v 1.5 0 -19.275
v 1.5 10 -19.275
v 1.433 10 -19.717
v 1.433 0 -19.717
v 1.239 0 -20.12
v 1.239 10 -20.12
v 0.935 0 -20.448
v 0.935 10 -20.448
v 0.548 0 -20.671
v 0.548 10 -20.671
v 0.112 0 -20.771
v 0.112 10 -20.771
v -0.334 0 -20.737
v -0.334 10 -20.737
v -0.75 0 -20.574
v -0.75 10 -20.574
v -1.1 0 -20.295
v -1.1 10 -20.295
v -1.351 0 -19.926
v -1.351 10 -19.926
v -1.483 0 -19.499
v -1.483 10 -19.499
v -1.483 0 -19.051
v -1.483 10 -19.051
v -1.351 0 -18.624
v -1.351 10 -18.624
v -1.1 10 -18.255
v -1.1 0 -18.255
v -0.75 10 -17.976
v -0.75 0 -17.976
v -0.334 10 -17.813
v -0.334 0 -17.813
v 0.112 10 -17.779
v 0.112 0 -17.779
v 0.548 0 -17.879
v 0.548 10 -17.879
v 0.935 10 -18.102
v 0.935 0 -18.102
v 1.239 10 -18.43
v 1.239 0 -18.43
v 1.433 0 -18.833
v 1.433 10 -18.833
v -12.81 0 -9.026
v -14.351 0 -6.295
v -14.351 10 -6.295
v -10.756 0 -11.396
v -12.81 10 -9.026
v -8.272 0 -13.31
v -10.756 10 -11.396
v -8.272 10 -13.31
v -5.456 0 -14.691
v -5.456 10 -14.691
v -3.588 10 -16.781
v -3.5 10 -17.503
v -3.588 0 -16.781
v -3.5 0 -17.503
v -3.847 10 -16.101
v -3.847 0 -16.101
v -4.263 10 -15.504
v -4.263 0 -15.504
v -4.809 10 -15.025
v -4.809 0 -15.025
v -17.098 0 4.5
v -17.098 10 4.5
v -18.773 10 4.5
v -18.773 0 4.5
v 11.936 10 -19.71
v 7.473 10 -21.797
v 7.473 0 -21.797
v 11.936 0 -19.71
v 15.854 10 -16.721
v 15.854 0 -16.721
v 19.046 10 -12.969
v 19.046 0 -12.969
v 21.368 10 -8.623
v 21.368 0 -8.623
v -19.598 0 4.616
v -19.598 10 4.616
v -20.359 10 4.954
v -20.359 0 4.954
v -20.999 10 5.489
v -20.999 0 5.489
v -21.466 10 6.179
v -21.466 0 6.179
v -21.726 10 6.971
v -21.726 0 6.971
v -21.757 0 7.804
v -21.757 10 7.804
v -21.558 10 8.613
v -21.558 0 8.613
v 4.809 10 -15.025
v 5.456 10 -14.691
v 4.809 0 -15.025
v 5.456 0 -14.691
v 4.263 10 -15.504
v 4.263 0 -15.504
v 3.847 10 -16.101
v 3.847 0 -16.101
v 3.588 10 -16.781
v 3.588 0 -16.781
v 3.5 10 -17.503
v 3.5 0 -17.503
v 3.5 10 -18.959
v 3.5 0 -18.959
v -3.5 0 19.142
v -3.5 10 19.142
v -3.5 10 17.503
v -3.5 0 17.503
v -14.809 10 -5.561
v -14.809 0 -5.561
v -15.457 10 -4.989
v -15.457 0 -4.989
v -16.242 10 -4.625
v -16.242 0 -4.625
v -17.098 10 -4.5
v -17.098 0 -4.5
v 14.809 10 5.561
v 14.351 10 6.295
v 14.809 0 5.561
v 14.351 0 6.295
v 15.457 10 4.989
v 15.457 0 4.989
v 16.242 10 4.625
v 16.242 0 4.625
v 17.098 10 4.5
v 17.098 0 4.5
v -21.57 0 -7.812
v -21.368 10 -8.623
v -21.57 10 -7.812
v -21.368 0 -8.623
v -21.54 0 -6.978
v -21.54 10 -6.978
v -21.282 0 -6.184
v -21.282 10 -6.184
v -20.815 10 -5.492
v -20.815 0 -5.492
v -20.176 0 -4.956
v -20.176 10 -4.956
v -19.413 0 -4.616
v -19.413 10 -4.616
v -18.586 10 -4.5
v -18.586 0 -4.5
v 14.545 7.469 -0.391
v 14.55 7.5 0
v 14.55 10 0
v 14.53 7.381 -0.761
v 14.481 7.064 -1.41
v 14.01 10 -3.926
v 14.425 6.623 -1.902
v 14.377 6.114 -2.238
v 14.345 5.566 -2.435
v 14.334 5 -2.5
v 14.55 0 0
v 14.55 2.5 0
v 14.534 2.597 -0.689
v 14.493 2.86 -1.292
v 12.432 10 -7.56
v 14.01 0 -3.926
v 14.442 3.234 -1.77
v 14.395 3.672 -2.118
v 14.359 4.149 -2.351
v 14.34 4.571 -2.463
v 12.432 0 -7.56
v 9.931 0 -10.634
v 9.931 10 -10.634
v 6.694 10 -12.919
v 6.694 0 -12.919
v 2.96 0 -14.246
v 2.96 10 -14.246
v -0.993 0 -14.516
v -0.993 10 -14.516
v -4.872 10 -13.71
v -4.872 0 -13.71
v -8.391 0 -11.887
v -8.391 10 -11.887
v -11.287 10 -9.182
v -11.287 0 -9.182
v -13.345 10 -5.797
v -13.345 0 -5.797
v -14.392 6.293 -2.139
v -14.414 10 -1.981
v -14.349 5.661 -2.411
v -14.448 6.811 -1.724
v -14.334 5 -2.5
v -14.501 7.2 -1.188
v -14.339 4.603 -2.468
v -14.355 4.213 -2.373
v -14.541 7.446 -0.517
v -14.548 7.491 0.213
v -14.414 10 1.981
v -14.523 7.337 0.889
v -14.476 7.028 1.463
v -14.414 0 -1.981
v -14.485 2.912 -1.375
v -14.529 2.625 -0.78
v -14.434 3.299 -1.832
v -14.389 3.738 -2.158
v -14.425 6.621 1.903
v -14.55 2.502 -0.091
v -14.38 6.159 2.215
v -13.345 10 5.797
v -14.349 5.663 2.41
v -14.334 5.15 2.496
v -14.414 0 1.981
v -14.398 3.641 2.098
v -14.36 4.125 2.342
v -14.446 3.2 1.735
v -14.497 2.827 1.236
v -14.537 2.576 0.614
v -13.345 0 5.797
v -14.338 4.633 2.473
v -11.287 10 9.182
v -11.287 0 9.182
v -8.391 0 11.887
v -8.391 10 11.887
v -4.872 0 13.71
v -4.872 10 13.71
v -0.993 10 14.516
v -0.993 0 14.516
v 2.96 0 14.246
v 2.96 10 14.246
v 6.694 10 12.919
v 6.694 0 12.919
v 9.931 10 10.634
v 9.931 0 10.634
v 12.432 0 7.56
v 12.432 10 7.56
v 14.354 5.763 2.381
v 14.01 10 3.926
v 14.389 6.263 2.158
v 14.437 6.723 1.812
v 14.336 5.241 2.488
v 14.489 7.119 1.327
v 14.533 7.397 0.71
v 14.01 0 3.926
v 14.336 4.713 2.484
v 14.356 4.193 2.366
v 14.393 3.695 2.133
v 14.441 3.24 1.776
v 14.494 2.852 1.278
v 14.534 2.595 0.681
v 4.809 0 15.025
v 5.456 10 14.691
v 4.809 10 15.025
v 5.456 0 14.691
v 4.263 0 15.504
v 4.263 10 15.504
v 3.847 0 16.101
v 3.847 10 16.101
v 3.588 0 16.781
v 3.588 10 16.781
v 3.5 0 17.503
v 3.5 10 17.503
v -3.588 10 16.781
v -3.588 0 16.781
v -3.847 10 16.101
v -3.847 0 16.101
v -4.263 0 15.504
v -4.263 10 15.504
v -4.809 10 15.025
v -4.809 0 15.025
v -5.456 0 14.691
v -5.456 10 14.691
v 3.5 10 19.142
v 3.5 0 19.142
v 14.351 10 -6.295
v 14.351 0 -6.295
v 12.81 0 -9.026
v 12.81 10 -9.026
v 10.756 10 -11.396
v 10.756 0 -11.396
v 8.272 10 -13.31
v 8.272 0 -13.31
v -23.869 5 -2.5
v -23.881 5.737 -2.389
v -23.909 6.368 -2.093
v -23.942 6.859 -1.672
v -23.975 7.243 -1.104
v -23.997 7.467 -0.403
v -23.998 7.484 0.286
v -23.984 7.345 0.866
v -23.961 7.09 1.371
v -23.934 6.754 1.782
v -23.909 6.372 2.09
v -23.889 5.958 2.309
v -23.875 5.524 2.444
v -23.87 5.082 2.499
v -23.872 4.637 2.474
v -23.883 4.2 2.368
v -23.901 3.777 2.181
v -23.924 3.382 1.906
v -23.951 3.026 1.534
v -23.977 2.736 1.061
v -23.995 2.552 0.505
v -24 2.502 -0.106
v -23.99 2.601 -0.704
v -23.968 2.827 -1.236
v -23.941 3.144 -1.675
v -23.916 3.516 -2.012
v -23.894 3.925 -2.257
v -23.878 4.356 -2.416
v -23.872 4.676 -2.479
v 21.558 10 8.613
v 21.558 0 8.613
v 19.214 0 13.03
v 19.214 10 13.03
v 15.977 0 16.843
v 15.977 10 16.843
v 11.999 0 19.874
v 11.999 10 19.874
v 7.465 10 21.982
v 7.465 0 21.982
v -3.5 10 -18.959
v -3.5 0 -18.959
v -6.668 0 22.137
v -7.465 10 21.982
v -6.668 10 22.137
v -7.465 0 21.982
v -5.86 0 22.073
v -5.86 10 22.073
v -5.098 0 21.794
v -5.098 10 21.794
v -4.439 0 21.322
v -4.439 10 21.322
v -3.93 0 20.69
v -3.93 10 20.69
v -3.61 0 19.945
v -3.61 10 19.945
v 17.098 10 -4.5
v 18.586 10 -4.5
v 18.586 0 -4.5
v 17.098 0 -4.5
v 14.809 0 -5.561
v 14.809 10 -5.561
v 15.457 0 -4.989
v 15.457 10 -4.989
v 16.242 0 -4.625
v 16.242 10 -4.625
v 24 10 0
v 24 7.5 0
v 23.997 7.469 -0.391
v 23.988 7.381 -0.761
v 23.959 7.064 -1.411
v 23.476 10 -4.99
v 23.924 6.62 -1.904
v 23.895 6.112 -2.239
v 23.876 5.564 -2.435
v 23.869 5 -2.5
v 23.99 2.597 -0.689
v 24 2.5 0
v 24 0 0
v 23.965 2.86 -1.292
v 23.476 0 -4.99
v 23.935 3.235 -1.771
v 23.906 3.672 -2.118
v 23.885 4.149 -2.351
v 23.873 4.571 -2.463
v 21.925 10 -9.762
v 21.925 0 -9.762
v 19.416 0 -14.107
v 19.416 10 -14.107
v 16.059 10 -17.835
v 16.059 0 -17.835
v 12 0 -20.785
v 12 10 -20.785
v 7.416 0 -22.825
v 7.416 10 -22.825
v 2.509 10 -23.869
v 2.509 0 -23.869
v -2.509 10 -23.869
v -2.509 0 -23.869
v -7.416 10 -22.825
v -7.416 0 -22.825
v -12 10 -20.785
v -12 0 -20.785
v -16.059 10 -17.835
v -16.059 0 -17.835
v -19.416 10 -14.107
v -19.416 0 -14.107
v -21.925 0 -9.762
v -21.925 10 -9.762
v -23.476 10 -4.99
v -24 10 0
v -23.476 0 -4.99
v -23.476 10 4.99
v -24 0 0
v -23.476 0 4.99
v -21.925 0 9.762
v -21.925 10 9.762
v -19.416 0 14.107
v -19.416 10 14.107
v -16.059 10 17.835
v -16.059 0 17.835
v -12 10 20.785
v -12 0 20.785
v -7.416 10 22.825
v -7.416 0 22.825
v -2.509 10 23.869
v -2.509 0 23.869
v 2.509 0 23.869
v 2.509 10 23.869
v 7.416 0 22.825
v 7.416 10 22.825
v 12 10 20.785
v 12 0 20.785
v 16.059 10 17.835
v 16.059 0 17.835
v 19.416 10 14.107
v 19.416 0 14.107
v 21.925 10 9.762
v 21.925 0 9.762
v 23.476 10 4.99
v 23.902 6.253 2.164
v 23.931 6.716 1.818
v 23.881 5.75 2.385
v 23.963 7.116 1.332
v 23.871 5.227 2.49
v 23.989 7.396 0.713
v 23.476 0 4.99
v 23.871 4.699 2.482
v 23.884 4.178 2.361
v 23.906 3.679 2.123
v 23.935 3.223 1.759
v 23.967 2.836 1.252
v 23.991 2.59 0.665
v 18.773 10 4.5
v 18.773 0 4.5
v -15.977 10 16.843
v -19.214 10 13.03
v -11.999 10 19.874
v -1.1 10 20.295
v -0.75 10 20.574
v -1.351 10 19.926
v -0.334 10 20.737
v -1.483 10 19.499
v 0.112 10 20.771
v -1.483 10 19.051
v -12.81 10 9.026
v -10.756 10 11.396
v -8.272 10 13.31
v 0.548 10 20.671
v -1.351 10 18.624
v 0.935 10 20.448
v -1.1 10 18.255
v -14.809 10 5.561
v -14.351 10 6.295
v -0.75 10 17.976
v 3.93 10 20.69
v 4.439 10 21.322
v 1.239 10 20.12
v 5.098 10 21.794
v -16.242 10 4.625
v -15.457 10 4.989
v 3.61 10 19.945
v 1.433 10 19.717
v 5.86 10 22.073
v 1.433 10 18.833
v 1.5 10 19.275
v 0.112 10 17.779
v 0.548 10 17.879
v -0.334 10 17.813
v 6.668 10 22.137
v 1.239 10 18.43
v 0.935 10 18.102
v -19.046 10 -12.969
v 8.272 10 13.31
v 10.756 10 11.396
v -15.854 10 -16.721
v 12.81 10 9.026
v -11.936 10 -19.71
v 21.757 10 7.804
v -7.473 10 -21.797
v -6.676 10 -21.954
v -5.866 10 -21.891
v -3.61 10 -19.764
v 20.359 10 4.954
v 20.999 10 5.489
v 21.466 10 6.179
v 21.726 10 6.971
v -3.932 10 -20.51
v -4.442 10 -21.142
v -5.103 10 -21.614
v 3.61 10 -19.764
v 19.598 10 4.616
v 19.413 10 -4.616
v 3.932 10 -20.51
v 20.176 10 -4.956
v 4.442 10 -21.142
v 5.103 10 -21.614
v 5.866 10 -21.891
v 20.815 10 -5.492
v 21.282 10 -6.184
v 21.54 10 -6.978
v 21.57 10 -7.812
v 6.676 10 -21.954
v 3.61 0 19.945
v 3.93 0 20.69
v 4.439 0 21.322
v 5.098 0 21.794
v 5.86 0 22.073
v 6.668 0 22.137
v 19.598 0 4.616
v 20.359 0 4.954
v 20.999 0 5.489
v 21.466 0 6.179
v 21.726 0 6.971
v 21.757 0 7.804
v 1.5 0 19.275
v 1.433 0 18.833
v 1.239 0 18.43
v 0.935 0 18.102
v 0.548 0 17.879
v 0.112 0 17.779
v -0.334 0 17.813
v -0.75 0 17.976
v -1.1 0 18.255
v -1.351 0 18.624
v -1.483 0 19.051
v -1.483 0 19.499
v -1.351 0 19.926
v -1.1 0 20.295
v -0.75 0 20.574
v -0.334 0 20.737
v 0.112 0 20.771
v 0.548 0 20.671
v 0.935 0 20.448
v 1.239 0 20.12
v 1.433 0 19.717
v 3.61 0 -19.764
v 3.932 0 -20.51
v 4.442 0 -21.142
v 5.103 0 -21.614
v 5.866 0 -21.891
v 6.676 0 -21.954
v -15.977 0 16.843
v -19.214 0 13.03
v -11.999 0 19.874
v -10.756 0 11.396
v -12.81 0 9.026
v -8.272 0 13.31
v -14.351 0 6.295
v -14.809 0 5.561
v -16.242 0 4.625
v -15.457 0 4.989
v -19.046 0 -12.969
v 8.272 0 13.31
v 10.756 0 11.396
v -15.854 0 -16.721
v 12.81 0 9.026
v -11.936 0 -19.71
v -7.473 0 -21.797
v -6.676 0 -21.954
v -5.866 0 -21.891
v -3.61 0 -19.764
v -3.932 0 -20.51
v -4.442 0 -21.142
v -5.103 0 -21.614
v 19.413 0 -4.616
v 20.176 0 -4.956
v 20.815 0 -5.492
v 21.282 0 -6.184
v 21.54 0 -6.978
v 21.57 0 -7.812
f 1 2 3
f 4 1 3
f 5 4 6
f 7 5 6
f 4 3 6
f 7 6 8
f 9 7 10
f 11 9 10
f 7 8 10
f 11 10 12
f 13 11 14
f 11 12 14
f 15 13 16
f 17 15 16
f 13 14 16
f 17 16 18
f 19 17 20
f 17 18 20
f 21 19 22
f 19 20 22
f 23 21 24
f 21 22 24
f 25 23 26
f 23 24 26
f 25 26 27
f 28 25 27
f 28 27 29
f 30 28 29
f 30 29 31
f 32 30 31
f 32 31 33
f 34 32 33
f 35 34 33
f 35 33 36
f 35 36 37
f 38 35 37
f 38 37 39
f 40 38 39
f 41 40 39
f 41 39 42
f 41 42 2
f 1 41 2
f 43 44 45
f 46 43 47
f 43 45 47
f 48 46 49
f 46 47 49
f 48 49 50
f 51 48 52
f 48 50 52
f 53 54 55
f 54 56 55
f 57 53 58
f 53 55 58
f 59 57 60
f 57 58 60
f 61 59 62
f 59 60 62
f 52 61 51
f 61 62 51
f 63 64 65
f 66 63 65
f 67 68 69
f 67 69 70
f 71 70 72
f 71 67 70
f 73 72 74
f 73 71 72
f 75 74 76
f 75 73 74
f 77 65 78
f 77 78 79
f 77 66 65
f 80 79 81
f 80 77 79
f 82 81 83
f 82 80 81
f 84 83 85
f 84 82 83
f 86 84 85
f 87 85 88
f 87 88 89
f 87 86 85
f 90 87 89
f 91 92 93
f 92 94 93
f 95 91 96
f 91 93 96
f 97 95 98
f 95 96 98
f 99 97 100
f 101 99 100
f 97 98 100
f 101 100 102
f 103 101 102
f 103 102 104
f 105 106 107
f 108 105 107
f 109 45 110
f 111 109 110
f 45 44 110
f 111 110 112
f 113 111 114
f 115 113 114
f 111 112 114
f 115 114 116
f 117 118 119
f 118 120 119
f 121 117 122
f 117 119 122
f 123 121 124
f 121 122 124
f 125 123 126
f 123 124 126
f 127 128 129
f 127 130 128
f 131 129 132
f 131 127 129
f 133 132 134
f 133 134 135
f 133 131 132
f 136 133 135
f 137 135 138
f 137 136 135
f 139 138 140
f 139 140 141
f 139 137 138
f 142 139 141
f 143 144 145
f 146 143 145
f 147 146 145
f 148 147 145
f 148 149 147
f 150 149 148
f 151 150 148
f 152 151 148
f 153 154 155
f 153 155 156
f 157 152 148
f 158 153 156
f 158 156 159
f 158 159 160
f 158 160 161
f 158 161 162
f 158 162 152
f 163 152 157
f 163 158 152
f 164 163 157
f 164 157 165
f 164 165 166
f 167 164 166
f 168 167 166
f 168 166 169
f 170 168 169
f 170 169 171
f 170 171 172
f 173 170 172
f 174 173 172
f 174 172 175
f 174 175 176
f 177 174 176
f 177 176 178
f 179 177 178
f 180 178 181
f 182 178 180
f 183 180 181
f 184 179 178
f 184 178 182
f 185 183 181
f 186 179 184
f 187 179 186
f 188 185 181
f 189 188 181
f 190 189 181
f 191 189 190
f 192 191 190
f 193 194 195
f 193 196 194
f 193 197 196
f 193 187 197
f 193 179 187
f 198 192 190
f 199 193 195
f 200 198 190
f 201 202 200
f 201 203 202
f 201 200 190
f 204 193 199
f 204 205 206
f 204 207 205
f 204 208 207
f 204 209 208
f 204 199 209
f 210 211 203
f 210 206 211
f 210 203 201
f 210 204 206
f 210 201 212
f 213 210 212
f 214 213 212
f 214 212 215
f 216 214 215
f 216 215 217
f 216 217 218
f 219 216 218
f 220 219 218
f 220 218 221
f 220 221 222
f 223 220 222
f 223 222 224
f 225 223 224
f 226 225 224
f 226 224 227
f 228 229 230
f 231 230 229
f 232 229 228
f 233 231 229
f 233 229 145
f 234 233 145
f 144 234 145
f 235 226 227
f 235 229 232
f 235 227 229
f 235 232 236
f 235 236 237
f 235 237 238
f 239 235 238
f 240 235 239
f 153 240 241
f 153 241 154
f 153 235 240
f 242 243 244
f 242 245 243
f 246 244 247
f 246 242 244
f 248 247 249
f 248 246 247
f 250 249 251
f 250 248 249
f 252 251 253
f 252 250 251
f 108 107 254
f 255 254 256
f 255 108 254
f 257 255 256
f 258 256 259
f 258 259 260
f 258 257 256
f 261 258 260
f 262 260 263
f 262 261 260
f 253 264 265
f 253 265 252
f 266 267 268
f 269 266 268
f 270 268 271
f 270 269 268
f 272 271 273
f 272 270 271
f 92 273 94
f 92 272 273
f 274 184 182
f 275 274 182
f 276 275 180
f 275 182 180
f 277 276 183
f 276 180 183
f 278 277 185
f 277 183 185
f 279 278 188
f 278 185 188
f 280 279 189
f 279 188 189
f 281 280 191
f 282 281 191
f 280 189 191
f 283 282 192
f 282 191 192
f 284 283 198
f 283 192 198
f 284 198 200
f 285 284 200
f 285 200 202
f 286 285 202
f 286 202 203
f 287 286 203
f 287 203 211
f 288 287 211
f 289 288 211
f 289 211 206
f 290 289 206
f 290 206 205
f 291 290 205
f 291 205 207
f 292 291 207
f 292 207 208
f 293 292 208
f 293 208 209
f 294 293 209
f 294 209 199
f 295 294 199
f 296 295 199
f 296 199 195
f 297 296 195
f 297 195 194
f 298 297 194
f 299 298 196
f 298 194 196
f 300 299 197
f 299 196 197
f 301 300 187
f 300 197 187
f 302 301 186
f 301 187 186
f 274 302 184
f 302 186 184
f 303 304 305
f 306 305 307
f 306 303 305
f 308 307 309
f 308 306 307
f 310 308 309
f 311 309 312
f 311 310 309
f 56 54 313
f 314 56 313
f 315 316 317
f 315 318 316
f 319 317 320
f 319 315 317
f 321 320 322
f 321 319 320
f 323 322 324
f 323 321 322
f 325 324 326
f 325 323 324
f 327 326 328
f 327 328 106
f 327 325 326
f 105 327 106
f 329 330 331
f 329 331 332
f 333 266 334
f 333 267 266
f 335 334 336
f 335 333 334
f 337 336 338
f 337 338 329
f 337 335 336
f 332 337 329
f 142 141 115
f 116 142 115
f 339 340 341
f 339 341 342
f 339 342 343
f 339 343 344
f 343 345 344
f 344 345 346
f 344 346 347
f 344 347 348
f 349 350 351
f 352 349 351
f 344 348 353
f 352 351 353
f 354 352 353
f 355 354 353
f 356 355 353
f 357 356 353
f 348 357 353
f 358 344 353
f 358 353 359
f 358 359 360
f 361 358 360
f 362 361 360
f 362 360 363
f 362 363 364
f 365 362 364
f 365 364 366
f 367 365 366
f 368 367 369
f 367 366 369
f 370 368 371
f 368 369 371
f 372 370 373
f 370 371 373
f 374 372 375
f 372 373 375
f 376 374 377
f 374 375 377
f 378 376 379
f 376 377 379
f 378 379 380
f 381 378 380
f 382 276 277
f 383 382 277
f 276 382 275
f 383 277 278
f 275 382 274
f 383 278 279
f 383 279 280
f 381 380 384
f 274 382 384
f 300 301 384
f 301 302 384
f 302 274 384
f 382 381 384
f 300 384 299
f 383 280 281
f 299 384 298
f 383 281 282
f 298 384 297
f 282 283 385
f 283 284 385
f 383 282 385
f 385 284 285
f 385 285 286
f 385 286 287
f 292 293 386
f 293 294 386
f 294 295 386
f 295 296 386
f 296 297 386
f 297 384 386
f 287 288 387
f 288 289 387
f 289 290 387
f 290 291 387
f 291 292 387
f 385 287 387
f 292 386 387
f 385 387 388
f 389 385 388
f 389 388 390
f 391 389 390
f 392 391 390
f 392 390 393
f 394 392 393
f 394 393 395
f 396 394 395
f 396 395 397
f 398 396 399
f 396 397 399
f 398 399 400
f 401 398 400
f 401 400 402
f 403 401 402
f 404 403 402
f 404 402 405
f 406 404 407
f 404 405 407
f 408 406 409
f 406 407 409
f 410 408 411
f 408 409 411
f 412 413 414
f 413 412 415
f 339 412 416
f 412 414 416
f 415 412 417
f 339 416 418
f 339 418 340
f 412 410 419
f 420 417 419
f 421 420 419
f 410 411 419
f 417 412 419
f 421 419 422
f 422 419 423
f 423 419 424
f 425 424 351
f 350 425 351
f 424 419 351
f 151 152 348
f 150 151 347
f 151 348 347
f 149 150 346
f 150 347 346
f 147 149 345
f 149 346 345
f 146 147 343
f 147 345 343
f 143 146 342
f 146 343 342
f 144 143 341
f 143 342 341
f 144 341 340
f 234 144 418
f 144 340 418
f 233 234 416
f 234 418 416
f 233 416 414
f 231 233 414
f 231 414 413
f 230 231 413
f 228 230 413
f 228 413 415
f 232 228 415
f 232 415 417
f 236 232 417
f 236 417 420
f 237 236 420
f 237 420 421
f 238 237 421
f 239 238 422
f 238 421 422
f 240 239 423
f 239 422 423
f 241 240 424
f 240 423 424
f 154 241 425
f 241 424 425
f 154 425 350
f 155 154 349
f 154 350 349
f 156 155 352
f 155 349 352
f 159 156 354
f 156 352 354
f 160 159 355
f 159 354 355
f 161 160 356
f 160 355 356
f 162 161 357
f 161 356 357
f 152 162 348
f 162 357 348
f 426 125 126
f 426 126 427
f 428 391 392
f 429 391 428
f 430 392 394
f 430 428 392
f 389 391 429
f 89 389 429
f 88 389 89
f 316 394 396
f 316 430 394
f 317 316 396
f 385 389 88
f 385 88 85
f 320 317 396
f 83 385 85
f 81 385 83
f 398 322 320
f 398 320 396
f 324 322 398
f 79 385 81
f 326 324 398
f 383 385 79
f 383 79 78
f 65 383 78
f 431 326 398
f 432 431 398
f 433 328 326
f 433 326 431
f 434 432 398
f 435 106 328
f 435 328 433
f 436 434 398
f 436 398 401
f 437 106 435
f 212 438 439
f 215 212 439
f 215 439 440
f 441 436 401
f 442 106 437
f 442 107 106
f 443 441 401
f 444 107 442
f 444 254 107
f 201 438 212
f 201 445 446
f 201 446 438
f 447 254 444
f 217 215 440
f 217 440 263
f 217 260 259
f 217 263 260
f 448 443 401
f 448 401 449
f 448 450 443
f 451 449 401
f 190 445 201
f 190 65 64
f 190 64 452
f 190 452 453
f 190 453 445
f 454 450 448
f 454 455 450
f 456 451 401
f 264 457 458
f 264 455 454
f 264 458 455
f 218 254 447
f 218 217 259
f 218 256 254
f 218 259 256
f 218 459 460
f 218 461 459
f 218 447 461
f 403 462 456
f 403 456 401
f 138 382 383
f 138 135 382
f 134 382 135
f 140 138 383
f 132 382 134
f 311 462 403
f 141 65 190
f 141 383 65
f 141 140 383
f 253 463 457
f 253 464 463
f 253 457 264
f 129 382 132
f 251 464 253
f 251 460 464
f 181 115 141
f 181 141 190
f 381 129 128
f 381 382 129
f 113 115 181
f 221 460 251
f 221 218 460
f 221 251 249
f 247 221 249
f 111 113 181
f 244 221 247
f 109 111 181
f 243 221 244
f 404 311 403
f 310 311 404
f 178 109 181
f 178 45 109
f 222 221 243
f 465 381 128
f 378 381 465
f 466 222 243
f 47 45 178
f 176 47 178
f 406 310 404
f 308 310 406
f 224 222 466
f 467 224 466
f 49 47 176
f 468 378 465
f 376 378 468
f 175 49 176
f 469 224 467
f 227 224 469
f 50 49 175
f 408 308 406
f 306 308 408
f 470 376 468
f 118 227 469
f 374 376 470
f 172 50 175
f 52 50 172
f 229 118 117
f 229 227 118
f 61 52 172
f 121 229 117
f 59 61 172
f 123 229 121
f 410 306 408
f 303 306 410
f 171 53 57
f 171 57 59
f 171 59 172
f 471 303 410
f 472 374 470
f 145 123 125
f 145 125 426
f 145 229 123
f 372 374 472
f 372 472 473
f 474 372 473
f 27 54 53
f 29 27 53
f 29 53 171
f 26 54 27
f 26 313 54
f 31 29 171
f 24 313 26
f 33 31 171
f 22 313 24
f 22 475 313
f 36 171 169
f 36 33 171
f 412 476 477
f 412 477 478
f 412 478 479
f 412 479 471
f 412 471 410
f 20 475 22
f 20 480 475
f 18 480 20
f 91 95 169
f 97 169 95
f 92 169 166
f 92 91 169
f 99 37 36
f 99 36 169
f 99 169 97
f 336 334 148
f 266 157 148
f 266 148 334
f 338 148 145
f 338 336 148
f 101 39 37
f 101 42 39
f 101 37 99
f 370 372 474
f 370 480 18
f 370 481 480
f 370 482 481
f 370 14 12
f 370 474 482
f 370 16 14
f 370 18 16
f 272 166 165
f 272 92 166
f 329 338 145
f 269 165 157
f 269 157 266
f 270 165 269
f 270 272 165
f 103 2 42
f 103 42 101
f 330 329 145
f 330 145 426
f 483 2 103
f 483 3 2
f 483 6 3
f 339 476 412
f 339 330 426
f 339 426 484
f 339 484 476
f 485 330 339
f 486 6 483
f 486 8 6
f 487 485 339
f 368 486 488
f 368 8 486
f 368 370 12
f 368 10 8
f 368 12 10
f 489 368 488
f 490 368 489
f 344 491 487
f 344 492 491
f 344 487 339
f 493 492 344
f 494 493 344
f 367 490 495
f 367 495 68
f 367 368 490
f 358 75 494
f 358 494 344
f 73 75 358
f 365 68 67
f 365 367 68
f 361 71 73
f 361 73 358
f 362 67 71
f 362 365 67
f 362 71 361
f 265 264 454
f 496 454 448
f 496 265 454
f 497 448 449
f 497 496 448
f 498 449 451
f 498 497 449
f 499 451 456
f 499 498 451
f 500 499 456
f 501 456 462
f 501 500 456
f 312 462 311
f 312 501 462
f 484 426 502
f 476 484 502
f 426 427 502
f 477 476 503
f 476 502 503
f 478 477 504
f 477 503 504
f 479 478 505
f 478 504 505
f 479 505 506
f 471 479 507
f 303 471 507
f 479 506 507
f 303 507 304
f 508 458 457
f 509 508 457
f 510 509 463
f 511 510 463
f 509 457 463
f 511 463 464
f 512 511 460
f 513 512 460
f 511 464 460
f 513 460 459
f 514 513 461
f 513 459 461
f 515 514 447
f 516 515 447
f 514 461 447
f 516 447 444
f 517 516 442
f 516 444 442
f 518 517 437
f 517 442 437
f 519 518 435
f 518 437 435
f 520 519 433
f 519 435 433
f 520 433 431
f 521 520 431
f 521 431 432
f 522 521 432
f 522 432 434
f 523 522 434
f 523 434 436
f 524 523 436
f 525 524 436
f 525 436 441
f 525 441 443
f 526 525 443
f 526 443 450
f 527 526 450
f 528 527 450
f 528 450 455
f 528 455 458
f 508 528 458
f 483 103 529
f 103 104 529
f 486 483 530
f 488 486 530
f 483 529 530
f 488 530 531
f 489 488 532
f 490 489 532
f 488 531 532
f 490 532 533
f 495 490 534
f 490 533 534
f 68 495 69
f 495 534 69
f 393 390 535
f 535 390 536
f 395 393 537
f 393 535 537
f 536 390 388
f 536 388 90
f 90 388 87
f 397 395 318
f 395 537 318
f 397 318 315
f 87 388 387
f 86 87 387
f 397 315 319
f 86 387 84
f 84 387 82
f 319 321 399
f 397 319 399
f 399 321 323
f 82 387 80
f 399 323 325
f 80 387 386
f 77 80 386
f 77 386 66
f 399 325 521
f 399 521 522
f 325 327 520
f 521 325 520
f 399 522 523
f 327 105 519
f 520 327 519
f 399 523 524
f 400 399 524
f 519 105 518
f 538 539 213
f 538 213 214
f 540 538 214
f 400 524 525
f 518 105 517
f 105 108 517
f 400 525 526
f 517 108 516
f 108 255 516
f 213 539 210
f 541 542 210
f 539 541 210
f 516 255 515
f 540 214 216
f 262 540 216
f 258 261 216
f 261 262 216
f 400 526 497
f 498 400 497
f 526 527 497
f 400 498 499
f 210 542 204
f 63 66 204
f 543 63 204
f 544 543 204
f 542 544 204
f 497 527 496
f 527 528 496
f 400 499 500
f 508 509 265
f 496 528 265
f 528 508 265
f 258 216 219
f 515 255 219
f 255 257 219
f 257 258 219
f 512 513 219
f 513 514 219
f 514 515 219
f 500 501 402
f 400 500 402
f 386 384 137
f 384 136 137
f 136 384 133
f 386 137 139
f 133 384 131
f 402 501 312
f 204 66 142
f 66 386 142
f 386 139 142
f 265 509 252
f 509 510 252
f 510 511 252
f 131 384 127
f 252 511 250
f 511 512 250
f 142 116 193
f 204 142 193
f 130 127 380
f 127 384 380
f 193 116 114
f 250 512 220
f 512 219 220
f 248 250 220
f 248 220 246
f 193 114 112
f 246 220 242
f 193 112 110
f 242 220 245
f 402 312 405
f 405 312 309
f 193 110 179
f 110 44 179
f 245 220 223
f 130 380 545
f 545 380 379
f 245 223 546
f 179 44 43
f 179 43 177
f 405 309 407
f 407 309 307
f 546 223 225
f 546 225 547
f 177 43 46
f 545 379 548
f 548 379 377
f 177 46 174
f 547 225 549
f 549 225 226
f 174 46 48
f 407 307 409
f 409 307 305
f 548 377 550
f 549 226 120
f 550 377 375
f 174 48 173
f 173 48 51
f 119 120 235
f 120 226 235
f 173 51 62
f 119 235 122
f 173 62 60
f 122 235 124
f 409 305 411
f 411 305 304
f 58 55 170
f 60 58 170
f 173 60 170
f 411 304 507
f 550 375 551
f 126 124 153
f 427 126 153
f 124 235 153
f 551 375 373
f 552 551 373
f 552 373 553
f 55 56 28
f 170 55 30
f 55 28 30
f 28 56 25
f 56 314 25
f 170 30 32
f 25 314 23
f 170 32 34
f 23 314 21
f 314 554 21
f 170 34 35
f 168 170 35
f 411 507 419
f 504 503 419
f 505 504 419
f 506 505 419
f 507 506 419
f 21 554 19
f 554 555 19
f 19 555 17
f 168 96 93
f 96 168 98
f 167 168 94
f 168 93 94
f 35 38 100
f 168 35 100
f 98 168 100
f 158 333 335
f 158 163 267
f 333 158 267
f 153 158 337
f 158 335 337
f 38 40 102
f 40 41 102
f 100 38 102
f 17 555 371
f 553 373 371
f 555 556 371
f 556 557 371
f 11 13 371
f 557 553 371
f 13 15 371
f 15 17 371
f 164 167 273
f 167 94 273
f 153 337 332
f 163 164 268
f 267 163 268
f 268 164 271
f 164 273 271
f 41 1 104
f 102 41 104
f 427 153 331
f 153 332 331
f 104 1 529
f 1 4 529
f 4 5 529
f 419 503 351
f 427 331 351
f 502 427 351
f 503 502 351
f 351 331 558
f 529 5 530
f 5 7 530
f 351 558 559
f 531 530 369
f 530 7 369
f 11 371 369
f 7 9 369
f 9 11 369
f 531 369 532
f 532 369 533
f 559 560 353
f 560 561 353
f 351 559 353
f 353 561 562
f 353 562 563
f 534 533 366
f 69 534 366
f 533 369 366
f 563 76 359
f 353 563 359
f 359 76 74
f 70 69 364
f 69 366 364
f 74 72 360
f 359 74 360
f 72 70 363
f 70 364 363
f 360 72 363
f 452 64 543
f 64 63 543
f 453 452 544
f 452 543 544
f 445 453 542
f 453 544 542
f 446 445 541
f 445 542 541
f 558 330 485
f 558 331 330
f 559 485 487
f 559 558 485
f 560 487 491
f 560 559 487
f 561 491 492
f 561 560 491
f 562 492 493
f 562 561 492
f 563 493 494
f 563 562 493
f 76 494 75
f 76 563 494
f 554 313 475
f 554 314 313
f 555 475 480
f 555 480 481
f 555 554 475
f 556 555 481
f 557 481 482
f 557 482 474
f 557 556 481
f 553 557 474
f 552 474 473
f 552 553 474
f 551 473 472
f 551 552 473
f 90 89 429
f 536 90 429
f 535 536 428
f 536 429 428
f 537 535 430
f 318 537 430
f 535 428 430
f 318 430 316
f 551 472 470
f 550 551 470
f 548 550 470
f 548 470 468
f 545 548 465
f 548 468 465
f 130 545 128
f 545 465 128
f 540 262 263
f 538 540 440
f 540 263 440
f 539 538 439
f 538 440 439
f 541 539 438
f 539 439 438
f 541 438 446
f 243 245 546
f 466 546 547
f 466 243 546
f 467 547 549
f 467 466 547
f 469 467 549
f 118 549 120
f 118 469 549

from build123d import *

# Parameters (mm, degrees)
SKETCH3_R           = 24
SKETCH3_R_2         = 14.55
BOSS_EXTRUDE1_DEPTH = 10
CUT_EXTRUDE2_START  = 50
SKETCH4_R           = 2.5
CUT_EXTRUDE2_DEPTH  = 100
SKETCH5_R           = 1.5
CUT_EXTRUDE3_DEPTH  = 100
CUT_EXTRUDE6_DEPTH  = 26
CUT_EXTRUDE7_DEPTH  = 26
CUT_EXTRUDE8_DEPTH  = 26
CUT_EXTRUDE9_DEPTH  = 26
FILLET5_R           = 3


with BuildPart() as part:
    # Sketch3 → Boss-Extrude1 (new body)
    with BuildSketch(Plane(origin=(0, 0, 0), x_dir=(1, 0, 0), z_dir=(0, 1, 0))):
        Circle(SKETCH3_R)
        Circle(SKETCH3_R_2, mode=Mode.SUBTRACT)
    extrude(amount=BOSS_EXTRUDE1_DEPTH)

    # Sketch4 → Cut-Extrude2 (cut)
    with BuildSketch(Plane(origin=(0, 0, 0), x_dir=(0, 0, -1), z_dir=(1, 0, 0)).offset(CUT_EXTRUDE2_START)):
        with Locations((0, 5)):
            Circle(SKETCH4_R)
    extrude(amount=-CUT_EXTRUDE2_DEPTH, mode=Mode.SUBTRACT)

    # Sketch5 → Cut-Extrude3 (cut)
    with BuildSketch(Plane(origin=(0, 10, 0), x_dir=(1, 0, 0), z_dir=(0, 1, 0))):
        with Locations((0, 19.275)):
            Circle(SKETCH5_R)
        with Locations((0, -19.275)):
            Circle(SKETCH5_R)
    extrude(amount=-CUT_EXTRUDE3_DEPTH, mode=Mode.SUBTRACT)

    # Sketch7 → Cut-Extrude6 (cut)
    with BuildSketch(Plane(origin=(0, 10, 0), x_dir=(1, 0, 0), z_dir=(0, 1, 0))):
        with BuildLine():
            Line((3.5, 15.275), (3.5, 22.775))
            ThreePointArc((3.5, 22.775), (15.930450829, 16.648464235), (22.598686356, 4.5))
            Line((22.598686356, 4.5), (15.010850242, 4.5))
            ThreePointArc((15.010850242, 4.5), (10.709250694, 11.440610761), (3.5, 15.275))
        make_face()
    extrude(amount=-CUT_EXTRUDE6_DEPTH, mode=Mode.SUBTRACT)

    # Sketch9 → Cut-Extrude7 (cut)
    with BuildSketch(Plane(origin=(0, 10, 0), x_dir=(1, 0, 0), z_dir=(0, 1, 0))):
        with BuildLine():
            Line((15.010850242, -4.5), (22.775, -4.5))
            ThreePointArc((22.775, -4.5), (16.052855024, -16.770702746), (3.5, -22.94995915))
            Line((3.5, -22.94995915), (3.5, -15.275))
            ThreePointArc((3.5, -15.275), (10.709250694, -11.440610761), (15.010850242, -4.5))
        make_face()
    extrude(amount=-CUT_EXTRUDE7_DEPTH, mode=Mode.SUBTRACT)

    # Sketch10 → Cut-Extrude8 (cut)
    with BuildSketch(Plane(origin=(0, 10, 0), x_dir=(1, 0, 0), z_dir=(0, 1, 0))):
        with BuildLine():
            Line((-3.5, 15.275), (-3.5, 22.775))
            ThreePointArc((-3.5, 22.775), (-15.930450829, 16.648464235), (-22.598686356, 4.5))
            Line((-22.598686356, 4.5), (-15.010850242, 4.5))
            ThreePointArc((-15.010850242, 4.5), (-10.709250694, 11.440610761), (-3.5, 15.275))
        make_face()
    extrude(amount=-CUT_EXTRUDE8_DEPTH, mode=Mode.SUBTRACT)

    # Sketch11 → Cut-Extrude9 (cut)
    with BuildSketch(Plane(origin=(0, 10, 0), x_dir=(1, 0, 0), z_dir=(0, 1, 0))):
        with BuildLine():
            Line((-15.010850242, -4.5), (-22.775, -4.5))
            ThreePointArc((-22.775, -4.5), (-16.052855024, -16.770702746), (-3.5, -22.94995915))
            Line((-3.5, -22.94995915), (-3.5, -15.275))
            ThreePointArc((-3.5, -15.275), (-10.709250694, -11.440610761), (-15.010850242, -4.5))
        make_face()
    extrude(amount=-CUT_EXTRUDE9_DEPTH, mode=Mode.SUBTRACT)

    # Fillet5
    fillet5_edges = [part.edges().sort_by_distance(p)[0] for p in [
        (-3.5, 5, 22.94995915),
        (-22.775, 5, 4.5),
        (-15.010850242, 5, 4.5),
        (-3.5, 5, 15.275),
        (3.5, 5, -22.775),
        (22.598686356, 5, -4.5),
        (15.010850242, 5, -4.5),
        (3.5, 5, -15.275),
        (3.5, 5, 15.275),
        (15.010850242, 5, 4.5),
        (22.775, 5, 4.5),
        (3.5, 5, 22.94995915),
        (-3.5, 5, -15.275),
        (-15.010850242, 5, -4.5),
        (-22.598686356, 5, -4.5),
        (-3.5, 5, -22.775),
    ]]
    fillet(fillet5_edges, radius=FILLET5_R)


solid = part.part
